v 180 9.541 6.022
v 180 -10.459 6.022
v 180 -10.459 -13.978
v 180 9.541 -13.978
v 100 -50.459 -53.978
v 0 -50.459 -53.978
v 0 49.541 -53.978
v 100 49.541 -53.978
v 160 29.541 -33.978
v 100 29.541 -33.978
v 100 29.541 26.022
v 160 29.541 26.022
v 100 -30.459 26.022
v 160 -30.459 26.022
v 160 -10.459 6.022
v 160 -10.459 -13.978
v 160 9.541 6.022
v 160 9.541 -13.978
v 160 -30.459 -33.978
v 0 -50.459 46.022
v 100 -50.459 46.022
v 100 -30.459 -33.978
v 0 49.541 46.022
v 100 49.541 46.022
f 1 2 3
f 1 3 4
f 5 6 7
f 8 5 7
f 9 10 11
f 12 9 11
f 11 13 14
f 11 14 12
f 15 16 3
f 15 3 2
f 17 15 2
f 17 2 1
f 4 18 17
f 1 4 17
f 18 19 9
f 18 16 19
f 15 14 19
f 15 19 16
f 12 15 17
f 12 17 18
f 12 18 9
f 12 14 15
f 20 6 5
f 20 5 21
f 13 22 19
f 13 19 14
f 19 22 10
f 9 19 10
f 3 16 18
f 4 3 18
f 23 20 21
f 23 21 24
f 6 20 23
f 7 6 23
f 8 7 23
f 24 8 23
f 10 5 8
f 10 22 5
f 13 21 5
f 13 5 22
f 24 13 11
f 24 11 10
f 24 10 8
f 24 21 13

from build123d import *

# Parameters (mm, degrees)
F0_W     = 100
F0_H     = 100
F1_DEPTH = 99.9998
F2_W     = 60
F2_H     = 60
F3_DEPTH = 60
F4_W     = 20
F4_H     = 20
F5_DEPTH = 20


with BuildPart() as f1:
    # F0 (on Right) → F1 (new body)
    with BuildSketch(Plane.YZ):
        with Locations((-0.458728, -3.978418)):
            Rectangle(F0_W, F0_H)
    extrude(amount=F1_DEPTH)

    # F2 (on face) → F3 (join)
    with BuildSketch(Plane.YZ.offset(99.9998)):
        with Locations((-0.458728, -3.978418)):
            Rectangle(F2_W, F2_H)
    extrude(amount=F3_DEPTH)

    # F4 (on face) → F5 (join)
    with BuildSketch(Plane.YZ.offset(159.9998)):
        with Locations((-0.458728, -3.978418)):
            Rectangle(F4_W, F4_H)
    extrude(amount=F5_DEPTH)


solid = f1.part
